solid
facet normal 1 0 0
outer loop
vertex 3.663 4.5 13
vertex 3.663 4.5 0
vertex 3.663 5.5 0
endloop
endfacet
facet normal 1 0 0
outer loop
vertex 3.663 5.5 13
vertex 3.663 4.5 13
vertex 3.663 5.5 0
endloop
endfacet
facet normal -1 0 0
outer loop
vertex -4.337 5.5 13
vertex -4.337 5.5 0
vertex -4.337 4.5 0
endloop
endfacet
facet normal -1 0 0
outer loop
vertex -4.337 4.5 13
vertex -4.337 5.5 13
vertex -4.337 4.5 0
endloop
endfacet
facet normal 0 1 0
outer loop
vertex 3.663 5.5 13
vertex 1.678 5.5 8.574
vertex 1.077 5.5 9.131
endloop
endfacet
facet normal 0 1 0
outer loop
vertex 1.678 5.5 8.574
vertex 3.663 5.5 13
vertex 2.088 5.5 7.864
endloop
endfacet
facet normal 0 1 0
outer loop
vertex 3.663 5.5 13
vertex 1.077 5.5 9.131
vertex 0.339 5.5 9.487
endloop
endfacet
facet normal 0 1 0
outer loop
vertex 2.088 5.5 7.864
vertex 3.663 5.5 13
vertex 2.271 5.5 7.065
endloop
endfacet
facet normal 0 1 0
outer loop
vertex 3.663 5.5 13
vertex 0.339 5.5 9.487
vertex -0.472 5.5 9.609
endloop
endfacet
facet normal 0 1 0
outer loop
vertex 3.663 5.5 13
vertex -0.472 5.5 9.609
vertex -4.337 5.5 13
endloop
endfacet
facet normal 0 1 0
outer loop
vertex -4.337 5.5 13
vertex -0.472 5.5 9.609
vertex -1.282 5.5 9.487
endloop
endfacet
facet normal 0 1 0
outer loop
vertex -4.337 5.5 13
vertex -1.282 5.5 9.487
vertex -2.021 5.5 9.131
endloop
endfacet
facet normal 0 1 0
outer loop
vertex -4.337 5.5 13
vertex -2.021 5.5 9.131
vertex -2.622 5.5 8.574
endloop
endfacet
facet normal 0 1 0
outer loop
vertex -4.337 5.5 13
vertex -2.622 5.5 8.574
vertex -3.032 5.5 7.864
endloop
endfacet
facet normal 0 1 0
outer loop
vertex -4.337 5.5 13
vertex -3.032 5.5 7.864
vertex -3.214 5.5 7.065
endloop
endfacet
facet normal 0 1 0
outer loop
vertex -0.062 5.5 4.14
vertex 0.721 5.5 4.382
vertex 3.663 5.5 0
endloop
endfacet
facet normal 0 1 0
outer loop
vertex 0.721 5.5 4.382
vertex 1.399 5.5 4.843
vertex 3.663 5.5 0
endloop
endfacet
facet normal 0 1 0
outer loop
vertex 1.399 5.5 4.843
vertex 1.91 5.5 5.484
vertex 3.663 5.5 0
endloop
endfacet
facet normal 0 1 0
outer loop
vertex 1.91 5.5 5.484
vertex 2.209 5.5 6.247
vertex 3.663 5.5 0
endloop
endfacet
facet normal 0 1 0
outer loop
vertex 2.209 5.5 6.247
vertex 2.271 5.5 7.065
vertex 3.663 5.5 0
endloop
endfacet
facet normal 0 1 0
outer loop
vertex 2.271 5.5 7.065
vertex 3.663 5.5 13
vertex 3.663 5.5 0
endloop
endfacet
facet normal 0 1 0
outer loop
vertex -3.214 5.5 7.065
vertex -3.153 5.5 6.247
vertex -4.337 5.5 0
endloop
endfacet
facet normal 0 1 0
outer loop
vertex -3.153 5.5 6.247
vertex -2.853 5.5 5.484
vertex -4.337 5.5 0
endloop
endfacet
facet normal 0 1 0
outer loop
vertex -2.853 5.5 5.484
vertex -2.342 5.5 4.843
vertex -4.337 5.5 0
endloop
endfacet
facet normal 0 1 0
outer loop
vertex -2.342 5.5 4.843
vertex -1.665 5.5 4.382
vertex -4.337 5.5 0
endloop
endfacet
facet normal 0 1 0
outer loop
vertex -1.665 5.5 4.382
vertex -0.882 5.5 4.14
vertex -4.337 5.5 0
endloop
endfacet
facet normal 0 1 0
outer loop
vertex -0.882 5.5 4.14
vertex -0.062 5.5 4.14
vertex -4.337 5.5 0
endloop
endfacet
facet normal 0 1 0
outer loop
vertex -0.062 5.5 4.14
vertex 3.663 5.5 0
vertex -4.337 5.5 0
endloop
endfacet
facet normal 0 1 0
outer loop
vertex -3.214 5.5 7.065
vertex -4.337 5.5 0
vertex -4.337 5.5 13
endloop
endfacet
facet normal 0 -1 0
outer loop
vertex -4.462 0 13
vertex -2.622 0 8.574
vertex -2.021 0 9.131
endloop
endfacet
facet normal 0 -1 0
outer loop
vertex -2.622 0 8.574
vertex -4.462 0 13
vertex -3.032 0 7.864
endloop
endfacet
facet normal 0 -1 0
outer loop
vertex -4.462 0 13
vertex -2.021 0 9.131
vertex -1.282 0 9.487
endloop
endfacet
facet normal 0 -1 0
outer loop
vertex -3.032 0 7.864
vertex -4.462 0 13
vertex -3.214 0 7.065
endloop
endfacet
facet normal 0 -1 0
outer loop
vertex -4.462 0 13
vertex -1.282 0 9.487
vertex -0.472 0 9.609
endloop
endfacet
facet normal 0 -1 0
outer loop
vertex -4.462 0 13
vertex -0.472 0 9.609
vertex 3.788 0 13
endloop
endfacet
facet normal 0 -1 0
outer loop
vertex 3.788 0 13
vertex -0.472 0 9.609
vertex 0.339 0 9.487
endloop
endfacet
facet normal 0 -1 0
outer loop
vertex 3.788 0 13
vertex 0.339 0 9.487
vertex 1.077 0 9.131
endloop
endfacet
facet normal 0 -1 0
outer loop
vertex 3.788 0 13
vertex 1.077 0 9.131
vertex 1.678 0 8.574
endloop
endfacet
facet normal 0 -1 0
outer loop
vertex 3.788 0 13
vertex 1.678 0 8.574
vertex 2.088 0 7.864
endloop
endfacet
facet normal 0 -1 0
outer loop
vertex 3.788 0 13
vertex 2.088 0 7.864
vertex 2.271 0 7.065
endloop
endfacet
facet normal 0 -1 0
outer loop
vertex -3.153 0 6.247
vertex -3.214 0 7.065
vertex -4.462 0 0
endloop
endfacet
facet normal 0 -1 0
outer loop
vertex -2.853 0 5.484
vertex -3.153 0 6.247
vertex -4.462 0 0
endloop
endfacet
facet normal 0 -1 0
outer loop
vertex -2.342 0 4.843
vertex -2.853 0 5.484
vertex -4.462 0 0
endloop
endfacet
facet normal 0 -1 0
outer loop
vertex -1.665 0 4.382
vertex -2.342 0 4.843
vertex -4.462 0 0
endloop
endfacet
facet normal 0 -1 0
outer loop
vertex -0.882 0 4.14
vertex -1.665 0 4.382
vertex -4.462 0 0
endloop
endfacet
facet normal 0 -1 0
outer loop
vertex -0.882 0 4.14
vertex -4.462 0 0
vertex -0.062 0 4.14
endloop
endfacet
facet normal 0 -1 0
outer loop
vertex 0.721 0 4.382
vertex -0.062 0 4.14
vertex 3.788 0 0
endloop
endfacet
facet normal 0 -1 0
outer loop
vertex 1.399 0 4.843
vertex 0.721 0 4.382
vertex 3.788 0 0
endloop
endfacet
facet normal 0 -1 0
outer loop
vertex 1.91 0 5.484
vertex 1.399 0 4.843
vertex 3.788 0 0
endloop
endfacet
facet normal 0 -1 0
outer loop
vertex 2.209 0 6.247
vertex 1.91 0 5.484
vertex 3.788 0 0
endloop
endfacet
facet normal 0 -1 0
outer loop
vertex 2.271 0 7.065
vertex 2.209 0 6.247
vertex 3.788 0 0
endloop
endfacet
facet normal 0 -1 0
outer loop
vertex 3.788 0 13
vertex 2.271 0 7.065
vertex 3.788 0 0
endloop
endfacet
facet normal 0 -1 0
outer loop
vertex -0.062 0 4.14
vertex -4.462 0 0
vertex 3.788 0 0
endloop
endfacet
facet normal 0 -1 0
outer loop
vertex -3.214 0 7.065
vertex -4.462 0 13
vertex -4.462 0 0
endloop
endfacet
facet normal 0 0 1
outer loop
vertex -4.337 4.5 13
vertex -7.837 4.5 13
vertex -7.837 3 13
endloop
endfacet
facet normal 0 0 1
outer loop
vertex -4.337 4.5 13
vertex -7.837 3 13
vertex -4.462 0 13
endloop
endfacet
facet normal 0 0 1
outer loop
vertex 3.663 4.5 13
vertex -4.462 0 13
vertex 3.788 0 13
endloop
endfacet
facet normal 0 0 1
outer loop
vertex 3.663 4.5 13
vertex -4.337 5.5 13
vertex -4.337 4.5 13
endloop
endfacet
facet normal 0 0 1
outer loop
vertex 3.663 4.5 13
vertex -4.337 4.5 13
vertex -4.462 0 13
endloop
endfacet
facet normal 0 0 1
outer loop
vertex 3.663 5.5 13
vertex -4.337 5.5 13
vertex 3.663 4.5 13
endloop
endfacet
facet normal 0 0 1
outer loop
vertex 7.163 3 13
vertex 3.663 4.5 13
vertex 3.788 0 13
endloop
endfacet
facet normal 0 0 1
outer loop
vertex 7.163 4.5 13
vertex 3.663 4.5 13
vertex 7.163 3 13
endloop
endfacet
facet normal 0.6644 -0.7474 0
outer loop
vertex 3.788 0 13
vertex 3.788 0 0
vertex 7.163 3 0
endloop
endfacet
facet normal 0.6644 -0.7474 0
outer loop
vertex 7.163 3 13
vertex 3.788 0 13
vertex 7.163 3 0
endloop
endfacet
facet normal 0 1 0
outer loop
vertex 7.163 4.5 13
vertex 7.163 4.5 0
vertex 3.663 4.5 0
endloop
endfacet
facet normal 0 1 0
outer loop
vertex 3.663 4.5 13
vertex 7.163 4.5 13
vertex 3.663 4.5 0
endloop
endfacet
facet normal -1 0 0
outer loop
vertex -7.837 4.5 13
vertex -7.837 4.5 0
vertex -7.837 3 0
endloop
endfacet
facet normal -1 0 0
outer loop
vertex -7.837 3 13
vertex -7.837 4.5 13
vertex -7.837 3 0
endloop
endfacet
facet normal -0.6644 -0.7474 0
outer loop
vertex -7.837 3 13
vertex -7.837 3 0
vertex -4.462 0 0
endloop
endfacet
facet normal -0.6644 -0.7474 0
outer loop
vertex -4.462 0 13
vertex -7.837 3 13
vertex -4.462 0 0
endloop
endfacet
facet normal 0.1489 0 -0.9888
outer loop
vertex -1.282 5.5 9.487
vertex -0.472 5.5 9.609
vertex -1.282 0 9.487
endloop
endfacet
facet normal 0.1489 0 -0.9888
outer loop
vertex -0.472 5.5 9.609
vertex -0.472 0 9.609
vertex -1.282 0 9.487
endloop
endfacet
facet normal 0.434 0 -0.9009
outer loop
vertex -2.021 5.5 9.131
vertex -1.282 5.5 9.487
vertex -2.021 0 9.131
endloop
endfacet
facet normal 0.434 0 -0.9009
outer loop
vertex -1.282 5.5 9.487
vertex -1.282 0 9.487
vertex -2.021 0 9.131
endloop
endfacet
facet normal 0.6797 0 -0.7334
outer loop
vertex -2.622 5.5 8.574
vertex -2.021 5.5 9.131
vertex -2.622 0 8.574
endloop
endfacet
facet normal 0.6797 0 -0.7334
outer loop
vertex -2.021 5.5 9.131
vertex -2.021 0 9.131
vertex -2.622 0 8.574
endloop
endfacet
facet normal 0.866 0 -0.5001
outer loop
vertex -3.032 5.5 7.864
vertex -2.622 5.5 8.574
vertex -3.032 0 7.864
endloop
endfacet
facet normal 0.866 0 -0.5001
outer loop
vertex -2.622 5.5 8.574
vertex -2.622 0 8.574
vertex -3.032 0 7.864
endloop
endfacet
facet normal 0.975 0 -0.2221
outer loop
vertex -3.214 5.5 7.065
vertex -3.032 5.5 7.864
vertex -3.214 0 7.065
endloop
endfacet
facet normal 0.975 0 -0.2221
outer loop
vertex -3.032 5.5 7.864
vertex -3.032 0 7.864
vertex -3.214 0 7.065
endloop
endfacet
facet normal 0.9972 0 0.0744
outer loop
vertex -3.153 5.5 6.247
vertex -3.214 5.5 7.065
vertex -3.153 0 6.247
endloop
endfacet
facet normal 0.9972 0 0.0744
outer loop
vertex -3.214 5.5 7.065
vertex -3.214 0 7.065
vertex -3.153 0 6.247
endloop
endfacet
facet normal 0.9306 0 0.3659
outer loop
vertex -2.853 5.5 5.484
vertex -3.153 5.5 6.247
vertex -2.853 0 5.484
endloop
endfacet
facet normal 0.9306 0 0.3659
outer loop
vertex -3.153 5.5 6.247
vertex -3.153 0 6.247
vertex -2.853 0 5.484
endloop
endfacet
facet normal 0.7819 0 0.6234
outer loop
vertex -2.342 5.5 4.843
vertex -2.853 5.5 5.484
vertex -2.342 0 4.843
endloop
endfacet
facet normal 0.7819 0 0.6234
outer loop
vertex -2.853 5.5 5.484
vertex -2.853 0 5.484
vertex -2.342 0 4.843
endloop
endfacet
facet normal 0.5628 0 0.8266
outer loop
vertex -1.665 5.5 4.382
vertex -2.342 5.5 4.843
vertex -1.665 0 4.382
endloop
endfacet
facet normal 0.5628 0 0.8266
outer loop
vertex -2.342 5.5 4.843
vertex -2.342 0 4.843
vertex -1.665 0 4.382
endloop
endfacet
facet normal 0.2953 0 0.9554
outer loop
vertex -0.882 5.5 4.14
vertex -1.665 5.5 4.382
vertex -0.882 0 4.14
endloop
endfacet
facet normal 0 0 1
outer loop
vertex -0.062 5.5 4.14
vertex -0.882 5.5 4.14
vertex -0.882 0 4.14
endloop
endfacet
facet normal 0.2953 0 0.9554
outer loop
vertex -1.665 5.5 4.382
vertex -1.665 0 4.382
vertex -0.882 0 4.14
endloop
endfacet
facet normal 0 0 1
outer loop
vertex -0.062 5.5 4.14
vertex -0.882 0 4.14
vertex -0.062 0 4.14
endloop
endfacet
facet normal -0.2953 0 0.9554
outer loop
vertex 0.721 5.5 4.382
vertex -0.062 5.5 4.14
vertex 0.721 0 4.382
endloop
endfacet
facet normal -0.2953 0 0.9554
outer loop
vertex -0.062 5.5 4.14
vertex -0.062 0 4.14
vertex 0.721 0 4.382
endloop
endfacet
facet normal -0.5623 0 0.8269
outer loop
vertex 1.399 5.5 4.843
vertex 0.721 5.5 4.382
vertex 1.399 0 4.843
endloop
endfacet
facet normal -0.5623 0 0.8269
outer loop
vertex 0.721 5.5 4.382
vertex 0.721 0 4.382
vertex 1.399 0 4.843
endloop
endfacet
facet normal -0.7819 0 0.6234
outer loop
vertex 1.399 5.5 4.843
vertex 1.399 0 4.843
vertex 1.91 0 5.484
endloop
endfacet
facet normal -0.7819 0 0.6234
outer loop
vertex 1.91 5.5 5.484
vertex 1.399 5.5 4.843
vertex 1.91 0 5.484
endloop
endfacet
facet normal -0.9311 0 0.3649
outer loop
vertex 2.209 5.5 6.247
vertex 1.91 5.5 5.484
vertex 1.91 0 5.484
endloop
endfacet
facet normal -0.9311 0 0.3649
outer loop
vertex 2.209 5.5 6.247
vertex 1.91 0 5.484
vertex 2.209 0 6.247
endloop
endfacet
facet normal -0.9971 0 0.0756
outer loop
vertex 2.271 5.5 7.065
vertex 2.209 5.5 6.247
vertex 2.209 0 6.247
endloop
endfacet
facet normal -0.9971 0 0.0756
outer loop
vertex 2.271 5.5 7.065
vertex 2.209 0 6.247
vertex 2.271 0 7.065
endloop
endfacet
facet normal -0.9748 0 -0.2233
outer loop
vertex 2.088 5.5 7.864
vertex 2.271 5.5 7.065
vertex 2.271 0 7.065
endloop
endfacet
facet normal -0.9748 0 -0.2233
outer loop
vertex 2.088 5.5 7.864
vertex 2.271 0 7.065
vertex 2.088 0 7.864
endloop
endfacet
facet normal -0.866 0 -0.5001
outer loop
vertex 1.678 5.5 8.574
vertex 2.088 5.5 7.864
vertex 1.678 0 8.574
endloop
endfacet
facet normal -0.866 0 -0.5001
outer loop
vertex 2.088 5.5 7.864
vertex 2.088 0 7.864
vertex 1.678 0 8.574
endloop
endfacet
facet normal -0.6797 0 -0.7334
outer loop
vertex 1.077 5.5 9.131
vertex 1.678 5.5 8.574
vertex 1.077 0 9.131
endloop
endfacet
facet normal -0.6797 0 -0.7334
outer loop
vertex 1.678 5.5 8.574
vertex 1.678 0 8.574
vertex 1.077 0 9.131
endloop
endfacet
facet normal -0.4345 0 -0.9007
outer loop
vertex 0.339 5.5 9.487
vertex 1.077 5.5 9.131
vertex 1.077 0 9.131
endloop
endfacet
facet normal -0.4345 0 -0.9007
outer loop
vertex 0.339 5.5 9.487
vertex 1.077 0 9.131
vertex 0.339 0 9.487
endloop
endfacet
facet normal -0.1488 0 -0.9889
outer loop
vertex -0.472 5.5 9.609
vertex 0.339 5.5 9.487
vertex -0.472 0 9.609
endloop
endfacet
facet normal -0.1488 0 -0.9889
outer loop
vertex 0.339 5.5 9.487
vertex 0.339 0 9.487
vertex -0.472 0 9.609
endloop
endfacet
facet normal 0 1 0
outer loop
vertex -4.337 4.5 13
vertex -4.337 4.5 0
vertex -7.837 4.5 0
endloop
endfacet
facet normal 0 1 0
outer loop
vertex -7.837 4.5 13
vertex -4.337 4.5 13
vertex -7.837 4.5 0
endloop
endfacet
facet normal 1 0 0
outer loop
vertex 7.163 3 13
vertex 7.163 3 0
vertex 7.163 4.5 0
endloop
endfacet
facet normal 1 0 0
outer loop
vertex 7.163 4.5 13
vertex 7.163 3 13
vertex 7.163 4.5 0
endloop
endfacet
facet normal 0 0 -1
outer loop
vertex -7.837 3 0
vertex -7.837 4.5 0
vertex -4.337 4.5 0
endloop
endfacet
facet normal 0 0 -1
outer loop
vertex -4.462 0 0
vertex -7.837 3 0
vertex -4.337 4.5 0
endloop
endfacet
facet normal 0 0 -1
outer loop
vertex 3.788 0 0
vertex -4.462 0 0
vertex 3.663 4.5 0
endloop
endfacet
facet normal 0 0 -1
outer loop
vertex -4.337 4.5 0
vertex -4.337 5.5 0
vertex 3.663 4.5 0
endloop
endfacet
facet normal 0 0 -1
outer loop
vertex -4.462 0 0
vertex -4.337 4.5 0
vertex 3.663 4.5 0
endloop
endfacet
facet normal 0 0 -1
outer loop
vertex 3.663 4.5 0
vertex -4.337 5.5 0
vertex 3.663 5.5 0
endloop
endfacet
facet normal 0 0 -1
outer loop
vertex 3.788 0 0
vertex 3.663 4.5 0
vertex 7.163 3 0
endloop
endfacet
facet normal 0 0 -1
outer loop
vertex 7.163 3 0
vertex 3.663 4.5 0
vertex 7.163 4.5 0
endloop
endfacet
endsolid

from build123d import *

# Parameters (mm, degrees)
EXTRUDE_1_DEPTH = 13


with BuildPart() as part:
    # Эскиз1 → Бобышка-Вытянуть1 (new body)
    with BuildSketch(Plane.XY):
        Polygon((-4.461885495, 0), (3.788114505, 0), (7.163114505, 3), (7.163114505, 4.5), (3.663114505, 4.5), (3.663114505, 5.5), (-4.336885495, 5.5), (-4.336885495, 4.5), (-7.836885495, 4.5), (-7.836885495, 3), align=None)
    extrude(amount=EXTRUDE_1_DEPTH)

    # Эскиз4 → Зенковка для  винта с плоской головкой M52 (revolve, cut)
    with BuildSketch(Plane(origin=(-0.471799648, 5.5, 6.859193471), x_dir=(0, 0, 1), z_dir=(1, 0, 0))):
        Polygon((0, 0), (0, 5.5), (2.75, 5.5), (2.75, 2.45), (2.75, 0), align=None)
    revolve(axis=Axis((-0.471799648, 11.85, 6.859193471), (0, -1, 0)), mode=Mode.SUBTRACT)


solid = part.part
